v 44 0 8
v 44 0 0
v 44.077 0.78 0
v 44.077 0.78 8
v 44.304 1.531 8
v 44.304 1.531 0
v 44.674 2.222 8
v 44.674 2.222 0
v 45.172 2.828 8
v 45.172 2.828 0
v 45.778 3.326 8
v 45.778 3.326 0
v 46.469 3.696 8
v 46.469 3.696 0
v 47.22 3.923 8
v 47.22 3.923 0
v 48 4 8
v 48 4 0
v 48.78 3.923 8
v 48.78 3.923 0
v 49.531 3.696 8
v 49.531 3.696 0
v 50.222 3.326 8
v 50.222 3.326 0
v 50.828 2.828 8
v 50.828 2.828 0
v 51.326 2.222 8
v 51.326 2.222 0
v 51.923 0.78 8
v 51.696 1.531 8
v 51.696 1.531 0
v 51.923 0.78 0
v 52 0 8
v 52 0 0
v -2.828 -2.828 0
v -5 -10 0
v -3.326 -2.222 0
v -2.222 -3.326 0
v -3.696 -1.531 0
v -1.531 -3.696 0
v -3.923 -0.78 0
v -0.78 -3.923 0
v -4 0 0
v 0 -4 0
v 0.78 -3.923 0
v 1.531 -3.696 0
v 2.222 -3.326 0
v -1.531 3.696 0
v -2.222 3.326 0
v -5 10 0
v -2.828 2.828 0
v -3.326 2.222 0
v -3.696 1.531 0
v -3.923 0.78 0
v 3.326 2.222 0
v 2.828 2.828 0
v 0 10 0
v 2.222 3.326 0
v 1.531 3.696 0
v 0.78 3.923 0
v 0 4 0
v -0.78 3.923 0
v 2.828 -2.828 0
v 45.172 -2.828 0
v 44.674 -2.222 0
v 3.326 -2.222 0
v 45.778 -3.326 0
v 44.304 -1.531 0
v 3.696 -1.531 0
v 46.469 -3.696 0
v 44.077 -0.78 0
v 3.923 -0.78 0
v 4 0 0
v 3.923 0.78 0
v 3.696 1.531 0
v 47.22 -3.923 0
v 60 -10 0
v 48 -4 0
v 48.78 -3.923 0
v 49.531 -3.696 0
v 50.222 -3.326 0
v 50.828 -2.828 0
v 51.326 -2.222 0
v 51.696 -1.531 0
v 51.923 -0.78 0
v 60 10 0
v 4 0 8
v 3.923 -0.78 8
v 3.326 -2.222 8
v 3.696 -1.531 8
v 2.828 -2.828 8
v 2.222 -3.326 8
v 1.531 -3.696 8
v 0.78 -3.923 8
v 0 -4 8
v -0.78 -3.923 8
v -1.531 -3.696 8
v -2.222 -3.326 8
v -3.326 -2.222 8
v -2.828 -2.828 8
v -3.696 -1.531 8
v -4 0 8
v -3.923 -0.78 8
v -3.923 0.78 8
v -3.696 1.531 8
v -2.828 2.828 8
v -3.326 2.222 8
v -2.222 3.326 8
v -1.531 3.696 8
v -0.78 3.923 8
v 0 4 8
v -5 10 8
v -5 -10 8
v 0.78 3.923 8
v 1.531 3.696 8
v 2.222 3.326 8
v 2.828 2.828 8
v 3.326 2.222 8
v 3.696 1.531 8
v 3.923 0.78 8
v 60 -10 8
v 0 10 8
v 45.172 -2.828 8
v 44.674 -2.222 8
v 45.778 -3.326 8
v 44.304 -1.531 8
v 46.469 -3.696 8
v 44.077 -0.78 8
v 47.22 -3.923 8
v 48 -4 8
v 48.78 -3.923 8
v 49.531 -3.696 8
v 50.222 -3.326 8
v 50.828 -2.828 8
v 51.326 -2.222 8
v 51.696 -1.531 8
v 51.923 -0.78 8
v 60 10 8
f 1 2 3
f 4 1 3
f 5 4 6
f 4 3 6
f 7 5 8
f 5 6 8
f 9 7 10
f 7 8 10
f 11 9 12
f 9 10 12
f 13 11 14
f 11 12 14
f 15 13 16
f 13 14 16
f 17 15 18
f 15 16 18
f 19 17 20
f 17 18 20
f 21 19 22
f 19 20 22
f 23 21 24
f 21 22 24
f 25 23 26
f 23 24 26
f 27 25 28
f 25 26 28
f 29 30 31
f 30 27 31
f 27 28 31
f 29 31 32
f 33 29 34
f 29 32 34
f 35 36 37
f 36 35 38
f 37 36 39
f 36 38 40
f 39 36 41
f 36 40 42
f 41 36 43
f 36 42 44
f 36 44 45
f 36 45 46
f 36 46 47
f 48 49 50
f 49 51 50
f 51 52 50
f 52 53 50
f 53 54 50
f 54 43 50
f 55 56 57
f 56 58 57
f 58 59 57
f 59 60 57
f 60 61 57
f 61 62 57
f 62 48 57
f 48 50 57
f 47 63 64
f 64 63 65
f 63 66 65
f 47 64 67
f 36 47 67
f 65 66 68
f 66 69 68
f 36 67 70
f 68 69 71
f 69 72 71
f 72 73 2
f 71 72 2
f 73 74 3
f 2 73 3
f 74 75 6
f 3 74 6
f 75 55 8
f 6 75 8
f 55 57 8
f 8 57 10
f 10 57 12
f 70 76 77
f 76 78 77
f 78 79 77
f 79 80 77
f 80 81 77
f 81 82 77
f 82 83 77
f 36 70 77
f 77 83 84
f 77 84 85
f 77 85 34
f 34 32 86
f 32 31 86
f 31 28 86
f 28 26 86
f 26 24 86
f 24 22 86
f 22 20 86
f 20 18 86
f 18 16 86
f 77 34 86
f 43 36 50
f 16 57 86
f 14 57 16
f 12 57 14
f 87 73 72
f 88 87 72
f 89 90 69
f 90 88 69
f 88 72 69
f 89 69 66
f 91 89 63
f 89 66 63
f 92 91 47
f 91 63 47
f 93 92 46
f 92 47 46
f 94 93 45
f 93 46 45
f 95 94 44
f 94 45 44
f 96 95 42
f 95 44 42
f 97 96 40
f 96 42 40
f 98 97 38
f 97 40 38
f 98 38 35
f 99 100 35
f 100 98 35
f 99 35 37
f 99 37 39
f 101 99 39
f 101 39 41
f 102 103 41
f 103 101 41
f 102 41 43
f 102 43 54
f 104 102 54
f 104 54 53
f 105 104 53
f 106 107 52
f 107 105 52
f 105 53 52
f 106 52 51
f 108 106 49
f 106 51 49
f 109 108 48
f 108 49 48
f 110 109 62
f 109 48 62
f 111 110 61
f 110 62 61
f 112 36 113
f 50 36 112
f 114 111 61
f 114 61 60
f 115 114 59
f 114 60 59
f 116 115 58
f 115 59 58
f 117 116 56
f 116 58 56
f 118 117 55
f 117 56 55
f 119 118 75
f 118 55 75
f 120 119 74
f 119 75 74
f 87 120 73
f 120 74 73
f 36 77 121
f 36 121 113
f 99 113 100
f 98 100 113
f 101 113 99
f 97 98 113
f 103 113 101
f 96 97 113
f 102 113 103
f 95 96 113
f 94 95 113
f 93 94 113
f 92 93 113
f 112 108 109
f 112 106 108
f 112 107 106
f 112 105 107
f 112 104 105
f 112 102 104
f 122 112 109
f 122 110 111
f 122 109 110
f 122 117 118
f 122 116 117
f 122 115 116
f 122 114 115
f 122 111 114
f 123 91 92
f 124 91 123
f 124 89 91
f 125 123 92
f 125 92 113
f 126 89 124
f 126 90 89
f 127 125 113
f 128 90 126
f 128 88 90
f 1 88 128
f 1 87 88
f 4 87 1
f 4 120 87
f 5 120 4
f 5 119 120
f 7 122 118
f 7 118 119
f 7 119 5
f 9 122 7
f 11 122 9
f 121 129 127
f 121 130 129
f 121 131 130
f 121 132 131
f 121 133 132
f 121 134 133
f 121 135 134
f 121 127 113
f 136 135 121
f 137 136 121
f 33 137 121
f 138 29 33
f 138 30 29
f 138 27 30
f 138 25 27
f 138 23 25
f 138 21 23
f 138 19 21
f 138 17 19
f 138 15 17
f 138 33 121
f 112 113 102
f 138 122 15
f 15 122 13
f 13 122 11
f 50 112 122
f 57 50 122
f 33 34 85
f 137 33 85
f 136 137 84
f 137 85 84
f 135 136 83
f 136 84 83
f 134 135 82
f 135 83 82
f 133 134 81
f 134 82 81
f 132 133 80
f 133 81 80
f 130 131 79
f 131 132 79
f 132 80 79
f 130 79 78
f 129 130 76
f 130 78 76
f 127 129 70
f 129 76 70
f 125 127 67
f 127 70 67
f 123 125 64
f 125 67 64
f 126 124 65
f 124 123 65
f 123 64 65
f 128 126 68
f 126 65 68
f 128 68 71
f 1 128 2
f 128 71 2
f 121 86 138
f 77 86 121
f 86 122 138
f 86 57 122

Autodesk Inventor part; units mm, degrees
ref_plane "YZ Plane" through (0, 0, 0) normal (1, 0, 0) x (0, 1, 0)
ref_plane "XZ Plane" through (0, 0, 0) normal (0, 1, 0) x (-1, 0, 0)
ref_plane "XY Plane" through (0, 0, 0) normal (0, 0, 1) x (1, 0, 0)
sketch "Sketch1" plane through (0, 0, 0) normal (0, 0, 1) x (1, 0, 0)
  circle A0 centre (0, 0) radius 4
  line L0 (0, 0) -> (48, 0)
  circle A1 centre (48, 0) radius 4
  line L1 (0, 0) -> (0, 10)
  line L2 (0, 10) -> (60, 10)
  line L3 (60, 10) -> (60, -10)
  line L4 (60, -10) -> (-5, -10)
  line L5 (-5, -10) -> (-5, 10)
  line L6 (-5, 10) -> (0, 10)
  dimension "d0" = 8
  dimension "d1" = 48
  dimension "d2" = 8
  dimension "d3" = 10
  dimension "d4" = 60
  dimension "d5" = 20
  dimension "d6" = 65
extrude "Extrusion1" add sketch "Sketch1" along normal blind 8
properties part number "plaque 2"
